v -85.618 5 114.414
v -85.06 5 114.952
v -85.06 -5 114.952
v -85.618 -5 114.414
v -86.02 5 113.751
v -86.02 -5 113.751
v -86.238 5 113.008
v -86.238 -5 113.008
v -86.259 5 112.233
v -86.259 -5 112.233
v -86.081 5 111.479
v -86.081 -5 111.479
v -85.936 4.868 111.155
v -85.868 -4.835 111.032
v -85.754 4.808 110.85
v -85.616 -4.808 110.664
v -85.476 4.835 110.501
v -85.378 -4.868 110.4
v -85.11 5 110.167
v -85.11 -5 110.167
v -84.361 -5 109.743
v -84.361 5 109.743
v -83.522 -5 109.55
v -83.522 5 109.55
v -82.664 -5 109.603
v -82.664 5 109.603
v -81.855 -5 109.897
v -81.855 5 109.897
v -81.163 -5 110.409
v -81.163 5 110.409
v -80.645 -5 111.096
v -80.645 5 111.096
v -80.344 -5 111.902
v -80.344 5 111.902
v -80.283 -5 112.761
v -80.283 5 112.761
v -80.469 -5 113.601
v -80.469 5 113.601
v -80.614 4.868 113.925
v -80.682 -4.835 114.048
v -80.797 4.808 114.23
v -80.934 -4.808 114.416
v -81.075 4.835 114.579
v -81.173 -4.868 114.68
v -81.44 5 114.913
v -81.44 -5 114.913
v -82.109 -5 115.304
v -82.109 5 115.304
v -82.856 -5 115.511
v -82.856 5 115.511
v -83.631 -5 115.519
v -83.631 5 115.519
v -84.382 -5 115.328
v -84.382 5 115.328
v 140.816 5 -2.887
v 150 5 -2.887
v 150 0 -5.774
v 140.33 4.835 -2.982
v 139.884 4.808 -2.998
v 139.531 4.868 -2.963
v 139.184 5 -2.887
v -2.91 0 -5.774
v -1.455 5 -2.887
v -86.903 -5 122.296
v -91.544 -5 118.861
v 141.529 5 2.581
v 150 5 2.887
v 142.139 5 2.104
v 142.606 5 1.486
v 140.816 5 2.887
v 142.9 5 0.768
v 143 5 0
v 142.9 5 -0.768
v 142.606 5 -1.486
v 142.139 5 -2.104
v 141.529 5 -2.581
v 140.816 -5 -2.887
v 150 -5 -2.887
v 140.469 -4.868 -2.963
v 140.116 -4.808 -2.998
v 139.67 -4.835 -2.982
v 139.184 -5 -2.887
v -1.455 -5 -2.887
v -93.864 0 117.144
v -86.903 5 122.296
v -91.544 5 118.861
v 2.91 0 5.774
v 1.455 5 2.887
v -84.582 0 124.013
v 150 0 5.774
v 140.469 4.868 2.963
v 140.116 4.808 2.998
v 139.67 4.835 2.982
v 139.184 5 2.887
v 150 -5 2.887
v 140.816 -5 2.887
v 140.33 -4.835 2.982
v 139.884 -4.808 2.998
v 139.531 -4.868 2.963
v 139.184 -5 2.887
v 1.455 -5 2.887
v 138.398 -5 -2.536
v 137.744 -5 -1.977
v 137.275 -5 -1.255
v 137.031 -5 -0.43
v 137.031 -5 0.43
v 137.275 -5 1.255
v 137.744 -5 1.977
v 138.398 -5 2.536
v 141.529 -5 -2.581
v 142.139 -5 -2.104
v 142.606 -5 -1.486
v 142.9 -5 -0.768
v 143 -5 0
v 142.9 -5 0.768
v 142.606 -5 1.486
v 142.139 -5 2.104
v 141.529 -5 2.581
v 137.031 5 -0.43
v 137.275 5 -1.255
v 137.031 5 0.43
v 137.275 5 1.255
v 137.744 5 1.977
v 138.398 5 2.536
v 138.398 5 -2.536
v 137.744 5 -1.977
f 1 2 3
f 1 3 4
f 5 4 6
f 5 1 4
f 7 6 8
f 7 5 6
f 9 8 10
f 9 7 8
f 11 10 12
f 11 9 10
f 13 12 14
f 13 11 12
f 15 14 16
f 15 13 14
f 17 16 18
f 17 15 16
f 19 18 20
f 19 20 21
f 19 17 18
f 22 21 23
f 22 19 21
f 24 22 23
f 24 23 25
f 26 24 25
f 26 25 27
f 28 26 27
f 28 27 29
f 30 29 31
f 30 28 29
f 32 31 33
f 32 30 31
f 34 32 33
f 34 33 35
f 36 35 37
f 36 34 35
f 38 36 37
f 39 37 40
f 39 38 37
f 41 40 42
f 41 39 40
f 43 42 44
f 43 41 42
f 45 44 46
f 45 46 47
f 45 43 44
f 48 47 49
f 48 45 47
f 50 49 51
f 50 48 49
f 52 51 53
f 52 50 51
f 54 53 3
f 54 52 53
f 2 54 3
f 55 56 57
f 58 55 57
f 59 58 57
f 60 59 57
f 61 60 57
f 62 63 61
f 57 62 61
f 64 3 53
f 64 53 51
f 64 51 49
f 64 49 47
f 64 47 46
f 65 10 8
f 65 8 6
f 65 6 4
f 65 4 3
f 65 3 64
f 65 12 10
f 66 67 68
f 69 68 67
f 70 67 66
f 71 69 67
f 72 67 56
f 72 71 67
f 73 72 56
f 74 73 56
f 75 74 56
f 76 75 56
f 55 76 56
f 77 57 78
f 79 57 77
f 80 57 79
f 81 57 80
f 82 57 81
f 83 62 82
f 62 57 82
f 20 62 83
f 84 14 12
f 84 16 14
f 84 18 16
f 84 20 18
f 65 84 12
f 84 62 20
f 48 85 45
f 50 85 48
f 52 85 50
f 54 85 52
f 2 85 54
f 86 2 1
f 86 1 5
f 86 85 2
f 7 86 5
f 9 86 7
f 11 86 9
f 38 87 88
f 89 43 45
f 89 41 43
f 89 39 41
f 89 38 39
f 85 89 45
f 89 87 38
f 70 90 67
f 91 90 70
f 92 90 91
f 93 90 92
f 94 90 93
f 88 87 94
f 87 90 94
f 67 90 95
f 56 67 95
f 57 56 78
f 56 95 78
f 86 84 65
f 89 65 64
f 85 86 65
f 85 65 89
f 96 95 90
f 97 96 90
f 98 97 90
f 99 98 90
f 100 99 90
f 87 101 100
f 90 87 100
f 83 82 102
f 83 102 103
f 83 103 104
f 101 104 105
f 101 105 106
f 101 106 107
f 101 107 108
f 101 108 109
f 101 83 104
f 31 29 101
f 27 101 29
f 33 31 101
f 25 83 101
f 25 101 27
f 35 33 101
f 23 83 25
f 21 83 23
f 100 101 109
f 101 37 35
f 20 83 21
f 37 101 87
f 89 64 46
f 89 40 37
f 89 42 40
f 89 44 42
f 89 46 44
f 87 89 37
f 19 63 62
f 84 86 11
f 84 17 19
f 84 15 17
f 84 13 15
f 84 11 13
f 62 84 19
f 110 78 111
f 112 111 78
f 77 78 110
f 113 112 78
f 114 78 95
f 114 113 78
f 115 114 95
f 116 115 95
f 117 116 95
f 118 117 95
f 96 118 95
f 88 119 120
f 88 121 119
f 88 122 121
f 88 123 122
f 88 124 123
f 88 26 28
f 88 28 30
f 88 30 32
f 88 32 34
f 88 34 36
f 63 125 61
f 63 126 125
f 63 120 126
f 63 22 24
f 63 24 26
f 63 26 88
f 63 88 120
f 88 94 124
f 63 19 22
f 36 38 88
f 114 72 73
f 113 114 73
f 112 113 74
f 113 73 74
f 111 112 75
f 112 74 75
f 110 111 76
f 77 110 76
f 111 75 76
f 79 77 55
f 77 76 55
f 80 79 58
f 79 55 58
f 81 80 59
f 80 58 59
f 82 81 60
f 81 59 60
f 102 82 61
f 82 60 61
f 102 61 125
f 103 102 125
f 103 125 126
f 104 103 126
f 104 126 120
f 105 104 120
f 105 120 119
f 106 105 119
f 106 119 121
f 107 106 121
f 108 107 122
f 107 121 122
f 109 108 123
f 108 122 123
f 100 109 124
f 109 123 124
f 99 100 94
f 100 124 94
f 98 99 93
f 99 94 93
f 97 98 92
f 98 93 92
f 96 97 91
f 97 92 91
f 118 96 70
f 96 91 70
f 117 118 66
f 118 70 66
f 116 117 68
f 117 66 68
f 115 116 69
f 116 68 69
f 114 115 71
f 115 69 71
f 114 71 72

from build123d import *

# Parameters (mm, degrees)
SKETCH4_R          = 3
CUT_EXTRUDE1_DEPTH = 11


with BuildPart() as part:
    # Sweep2: sweep along a path in Sketch1
    with BuildLine(Plane(origin=(0, 0, 0), x_dir=(1, 0, 0), z_dir=(0, 1, 0))) as sweep2_path:
        Line((150, 0), (0, 0))
        Line((0, 0), (-89.223418013, -120.578529093))
    # Sketch2 → Sweep2 (sweep)
    with BuildSketch(Plane(origin=(-89.223418013, 0, 120.578529093), x_dir=(0.803856861, 0, 0.594822787), z_dir=(-0.594822787, 0, 0.803856861))):
        Polygon((2.886751346, -5), (5.773502692, 0), (2.886751346, 5), (-2.886751346, 5), (-5.773502692, 0), (-2.886751346, -5), align=None)
    sweep(path=sweep2_path.line, transition=Transition.RIGHT)

    # Sketch4 → Cut-Extrude1 (cut, through all)
    with BuildSketch(Plane(origin=(0, 5, 0), x_dir=(1, 0, 0), z_dir=(0, 1, 0))):
        with Locations((140, 0)):
            Circle(SKETCH4_R)
    cut_extrude1 = extrude(amount=-CUT_EXTRUDE1_DEPTH, mode=Mode.SUBTRACT)

    # Mirror1: Cut-Extrude1 across plane
    add(cut_extrude1.mirror(Plane(origin=(0, 0, 0), x_dir=(0.450098441, 0, 0.892978943), z_dir=(0.892978943, 0, -0.450098441))), mode=Mode.SUBTRACT)


solid = part.part
